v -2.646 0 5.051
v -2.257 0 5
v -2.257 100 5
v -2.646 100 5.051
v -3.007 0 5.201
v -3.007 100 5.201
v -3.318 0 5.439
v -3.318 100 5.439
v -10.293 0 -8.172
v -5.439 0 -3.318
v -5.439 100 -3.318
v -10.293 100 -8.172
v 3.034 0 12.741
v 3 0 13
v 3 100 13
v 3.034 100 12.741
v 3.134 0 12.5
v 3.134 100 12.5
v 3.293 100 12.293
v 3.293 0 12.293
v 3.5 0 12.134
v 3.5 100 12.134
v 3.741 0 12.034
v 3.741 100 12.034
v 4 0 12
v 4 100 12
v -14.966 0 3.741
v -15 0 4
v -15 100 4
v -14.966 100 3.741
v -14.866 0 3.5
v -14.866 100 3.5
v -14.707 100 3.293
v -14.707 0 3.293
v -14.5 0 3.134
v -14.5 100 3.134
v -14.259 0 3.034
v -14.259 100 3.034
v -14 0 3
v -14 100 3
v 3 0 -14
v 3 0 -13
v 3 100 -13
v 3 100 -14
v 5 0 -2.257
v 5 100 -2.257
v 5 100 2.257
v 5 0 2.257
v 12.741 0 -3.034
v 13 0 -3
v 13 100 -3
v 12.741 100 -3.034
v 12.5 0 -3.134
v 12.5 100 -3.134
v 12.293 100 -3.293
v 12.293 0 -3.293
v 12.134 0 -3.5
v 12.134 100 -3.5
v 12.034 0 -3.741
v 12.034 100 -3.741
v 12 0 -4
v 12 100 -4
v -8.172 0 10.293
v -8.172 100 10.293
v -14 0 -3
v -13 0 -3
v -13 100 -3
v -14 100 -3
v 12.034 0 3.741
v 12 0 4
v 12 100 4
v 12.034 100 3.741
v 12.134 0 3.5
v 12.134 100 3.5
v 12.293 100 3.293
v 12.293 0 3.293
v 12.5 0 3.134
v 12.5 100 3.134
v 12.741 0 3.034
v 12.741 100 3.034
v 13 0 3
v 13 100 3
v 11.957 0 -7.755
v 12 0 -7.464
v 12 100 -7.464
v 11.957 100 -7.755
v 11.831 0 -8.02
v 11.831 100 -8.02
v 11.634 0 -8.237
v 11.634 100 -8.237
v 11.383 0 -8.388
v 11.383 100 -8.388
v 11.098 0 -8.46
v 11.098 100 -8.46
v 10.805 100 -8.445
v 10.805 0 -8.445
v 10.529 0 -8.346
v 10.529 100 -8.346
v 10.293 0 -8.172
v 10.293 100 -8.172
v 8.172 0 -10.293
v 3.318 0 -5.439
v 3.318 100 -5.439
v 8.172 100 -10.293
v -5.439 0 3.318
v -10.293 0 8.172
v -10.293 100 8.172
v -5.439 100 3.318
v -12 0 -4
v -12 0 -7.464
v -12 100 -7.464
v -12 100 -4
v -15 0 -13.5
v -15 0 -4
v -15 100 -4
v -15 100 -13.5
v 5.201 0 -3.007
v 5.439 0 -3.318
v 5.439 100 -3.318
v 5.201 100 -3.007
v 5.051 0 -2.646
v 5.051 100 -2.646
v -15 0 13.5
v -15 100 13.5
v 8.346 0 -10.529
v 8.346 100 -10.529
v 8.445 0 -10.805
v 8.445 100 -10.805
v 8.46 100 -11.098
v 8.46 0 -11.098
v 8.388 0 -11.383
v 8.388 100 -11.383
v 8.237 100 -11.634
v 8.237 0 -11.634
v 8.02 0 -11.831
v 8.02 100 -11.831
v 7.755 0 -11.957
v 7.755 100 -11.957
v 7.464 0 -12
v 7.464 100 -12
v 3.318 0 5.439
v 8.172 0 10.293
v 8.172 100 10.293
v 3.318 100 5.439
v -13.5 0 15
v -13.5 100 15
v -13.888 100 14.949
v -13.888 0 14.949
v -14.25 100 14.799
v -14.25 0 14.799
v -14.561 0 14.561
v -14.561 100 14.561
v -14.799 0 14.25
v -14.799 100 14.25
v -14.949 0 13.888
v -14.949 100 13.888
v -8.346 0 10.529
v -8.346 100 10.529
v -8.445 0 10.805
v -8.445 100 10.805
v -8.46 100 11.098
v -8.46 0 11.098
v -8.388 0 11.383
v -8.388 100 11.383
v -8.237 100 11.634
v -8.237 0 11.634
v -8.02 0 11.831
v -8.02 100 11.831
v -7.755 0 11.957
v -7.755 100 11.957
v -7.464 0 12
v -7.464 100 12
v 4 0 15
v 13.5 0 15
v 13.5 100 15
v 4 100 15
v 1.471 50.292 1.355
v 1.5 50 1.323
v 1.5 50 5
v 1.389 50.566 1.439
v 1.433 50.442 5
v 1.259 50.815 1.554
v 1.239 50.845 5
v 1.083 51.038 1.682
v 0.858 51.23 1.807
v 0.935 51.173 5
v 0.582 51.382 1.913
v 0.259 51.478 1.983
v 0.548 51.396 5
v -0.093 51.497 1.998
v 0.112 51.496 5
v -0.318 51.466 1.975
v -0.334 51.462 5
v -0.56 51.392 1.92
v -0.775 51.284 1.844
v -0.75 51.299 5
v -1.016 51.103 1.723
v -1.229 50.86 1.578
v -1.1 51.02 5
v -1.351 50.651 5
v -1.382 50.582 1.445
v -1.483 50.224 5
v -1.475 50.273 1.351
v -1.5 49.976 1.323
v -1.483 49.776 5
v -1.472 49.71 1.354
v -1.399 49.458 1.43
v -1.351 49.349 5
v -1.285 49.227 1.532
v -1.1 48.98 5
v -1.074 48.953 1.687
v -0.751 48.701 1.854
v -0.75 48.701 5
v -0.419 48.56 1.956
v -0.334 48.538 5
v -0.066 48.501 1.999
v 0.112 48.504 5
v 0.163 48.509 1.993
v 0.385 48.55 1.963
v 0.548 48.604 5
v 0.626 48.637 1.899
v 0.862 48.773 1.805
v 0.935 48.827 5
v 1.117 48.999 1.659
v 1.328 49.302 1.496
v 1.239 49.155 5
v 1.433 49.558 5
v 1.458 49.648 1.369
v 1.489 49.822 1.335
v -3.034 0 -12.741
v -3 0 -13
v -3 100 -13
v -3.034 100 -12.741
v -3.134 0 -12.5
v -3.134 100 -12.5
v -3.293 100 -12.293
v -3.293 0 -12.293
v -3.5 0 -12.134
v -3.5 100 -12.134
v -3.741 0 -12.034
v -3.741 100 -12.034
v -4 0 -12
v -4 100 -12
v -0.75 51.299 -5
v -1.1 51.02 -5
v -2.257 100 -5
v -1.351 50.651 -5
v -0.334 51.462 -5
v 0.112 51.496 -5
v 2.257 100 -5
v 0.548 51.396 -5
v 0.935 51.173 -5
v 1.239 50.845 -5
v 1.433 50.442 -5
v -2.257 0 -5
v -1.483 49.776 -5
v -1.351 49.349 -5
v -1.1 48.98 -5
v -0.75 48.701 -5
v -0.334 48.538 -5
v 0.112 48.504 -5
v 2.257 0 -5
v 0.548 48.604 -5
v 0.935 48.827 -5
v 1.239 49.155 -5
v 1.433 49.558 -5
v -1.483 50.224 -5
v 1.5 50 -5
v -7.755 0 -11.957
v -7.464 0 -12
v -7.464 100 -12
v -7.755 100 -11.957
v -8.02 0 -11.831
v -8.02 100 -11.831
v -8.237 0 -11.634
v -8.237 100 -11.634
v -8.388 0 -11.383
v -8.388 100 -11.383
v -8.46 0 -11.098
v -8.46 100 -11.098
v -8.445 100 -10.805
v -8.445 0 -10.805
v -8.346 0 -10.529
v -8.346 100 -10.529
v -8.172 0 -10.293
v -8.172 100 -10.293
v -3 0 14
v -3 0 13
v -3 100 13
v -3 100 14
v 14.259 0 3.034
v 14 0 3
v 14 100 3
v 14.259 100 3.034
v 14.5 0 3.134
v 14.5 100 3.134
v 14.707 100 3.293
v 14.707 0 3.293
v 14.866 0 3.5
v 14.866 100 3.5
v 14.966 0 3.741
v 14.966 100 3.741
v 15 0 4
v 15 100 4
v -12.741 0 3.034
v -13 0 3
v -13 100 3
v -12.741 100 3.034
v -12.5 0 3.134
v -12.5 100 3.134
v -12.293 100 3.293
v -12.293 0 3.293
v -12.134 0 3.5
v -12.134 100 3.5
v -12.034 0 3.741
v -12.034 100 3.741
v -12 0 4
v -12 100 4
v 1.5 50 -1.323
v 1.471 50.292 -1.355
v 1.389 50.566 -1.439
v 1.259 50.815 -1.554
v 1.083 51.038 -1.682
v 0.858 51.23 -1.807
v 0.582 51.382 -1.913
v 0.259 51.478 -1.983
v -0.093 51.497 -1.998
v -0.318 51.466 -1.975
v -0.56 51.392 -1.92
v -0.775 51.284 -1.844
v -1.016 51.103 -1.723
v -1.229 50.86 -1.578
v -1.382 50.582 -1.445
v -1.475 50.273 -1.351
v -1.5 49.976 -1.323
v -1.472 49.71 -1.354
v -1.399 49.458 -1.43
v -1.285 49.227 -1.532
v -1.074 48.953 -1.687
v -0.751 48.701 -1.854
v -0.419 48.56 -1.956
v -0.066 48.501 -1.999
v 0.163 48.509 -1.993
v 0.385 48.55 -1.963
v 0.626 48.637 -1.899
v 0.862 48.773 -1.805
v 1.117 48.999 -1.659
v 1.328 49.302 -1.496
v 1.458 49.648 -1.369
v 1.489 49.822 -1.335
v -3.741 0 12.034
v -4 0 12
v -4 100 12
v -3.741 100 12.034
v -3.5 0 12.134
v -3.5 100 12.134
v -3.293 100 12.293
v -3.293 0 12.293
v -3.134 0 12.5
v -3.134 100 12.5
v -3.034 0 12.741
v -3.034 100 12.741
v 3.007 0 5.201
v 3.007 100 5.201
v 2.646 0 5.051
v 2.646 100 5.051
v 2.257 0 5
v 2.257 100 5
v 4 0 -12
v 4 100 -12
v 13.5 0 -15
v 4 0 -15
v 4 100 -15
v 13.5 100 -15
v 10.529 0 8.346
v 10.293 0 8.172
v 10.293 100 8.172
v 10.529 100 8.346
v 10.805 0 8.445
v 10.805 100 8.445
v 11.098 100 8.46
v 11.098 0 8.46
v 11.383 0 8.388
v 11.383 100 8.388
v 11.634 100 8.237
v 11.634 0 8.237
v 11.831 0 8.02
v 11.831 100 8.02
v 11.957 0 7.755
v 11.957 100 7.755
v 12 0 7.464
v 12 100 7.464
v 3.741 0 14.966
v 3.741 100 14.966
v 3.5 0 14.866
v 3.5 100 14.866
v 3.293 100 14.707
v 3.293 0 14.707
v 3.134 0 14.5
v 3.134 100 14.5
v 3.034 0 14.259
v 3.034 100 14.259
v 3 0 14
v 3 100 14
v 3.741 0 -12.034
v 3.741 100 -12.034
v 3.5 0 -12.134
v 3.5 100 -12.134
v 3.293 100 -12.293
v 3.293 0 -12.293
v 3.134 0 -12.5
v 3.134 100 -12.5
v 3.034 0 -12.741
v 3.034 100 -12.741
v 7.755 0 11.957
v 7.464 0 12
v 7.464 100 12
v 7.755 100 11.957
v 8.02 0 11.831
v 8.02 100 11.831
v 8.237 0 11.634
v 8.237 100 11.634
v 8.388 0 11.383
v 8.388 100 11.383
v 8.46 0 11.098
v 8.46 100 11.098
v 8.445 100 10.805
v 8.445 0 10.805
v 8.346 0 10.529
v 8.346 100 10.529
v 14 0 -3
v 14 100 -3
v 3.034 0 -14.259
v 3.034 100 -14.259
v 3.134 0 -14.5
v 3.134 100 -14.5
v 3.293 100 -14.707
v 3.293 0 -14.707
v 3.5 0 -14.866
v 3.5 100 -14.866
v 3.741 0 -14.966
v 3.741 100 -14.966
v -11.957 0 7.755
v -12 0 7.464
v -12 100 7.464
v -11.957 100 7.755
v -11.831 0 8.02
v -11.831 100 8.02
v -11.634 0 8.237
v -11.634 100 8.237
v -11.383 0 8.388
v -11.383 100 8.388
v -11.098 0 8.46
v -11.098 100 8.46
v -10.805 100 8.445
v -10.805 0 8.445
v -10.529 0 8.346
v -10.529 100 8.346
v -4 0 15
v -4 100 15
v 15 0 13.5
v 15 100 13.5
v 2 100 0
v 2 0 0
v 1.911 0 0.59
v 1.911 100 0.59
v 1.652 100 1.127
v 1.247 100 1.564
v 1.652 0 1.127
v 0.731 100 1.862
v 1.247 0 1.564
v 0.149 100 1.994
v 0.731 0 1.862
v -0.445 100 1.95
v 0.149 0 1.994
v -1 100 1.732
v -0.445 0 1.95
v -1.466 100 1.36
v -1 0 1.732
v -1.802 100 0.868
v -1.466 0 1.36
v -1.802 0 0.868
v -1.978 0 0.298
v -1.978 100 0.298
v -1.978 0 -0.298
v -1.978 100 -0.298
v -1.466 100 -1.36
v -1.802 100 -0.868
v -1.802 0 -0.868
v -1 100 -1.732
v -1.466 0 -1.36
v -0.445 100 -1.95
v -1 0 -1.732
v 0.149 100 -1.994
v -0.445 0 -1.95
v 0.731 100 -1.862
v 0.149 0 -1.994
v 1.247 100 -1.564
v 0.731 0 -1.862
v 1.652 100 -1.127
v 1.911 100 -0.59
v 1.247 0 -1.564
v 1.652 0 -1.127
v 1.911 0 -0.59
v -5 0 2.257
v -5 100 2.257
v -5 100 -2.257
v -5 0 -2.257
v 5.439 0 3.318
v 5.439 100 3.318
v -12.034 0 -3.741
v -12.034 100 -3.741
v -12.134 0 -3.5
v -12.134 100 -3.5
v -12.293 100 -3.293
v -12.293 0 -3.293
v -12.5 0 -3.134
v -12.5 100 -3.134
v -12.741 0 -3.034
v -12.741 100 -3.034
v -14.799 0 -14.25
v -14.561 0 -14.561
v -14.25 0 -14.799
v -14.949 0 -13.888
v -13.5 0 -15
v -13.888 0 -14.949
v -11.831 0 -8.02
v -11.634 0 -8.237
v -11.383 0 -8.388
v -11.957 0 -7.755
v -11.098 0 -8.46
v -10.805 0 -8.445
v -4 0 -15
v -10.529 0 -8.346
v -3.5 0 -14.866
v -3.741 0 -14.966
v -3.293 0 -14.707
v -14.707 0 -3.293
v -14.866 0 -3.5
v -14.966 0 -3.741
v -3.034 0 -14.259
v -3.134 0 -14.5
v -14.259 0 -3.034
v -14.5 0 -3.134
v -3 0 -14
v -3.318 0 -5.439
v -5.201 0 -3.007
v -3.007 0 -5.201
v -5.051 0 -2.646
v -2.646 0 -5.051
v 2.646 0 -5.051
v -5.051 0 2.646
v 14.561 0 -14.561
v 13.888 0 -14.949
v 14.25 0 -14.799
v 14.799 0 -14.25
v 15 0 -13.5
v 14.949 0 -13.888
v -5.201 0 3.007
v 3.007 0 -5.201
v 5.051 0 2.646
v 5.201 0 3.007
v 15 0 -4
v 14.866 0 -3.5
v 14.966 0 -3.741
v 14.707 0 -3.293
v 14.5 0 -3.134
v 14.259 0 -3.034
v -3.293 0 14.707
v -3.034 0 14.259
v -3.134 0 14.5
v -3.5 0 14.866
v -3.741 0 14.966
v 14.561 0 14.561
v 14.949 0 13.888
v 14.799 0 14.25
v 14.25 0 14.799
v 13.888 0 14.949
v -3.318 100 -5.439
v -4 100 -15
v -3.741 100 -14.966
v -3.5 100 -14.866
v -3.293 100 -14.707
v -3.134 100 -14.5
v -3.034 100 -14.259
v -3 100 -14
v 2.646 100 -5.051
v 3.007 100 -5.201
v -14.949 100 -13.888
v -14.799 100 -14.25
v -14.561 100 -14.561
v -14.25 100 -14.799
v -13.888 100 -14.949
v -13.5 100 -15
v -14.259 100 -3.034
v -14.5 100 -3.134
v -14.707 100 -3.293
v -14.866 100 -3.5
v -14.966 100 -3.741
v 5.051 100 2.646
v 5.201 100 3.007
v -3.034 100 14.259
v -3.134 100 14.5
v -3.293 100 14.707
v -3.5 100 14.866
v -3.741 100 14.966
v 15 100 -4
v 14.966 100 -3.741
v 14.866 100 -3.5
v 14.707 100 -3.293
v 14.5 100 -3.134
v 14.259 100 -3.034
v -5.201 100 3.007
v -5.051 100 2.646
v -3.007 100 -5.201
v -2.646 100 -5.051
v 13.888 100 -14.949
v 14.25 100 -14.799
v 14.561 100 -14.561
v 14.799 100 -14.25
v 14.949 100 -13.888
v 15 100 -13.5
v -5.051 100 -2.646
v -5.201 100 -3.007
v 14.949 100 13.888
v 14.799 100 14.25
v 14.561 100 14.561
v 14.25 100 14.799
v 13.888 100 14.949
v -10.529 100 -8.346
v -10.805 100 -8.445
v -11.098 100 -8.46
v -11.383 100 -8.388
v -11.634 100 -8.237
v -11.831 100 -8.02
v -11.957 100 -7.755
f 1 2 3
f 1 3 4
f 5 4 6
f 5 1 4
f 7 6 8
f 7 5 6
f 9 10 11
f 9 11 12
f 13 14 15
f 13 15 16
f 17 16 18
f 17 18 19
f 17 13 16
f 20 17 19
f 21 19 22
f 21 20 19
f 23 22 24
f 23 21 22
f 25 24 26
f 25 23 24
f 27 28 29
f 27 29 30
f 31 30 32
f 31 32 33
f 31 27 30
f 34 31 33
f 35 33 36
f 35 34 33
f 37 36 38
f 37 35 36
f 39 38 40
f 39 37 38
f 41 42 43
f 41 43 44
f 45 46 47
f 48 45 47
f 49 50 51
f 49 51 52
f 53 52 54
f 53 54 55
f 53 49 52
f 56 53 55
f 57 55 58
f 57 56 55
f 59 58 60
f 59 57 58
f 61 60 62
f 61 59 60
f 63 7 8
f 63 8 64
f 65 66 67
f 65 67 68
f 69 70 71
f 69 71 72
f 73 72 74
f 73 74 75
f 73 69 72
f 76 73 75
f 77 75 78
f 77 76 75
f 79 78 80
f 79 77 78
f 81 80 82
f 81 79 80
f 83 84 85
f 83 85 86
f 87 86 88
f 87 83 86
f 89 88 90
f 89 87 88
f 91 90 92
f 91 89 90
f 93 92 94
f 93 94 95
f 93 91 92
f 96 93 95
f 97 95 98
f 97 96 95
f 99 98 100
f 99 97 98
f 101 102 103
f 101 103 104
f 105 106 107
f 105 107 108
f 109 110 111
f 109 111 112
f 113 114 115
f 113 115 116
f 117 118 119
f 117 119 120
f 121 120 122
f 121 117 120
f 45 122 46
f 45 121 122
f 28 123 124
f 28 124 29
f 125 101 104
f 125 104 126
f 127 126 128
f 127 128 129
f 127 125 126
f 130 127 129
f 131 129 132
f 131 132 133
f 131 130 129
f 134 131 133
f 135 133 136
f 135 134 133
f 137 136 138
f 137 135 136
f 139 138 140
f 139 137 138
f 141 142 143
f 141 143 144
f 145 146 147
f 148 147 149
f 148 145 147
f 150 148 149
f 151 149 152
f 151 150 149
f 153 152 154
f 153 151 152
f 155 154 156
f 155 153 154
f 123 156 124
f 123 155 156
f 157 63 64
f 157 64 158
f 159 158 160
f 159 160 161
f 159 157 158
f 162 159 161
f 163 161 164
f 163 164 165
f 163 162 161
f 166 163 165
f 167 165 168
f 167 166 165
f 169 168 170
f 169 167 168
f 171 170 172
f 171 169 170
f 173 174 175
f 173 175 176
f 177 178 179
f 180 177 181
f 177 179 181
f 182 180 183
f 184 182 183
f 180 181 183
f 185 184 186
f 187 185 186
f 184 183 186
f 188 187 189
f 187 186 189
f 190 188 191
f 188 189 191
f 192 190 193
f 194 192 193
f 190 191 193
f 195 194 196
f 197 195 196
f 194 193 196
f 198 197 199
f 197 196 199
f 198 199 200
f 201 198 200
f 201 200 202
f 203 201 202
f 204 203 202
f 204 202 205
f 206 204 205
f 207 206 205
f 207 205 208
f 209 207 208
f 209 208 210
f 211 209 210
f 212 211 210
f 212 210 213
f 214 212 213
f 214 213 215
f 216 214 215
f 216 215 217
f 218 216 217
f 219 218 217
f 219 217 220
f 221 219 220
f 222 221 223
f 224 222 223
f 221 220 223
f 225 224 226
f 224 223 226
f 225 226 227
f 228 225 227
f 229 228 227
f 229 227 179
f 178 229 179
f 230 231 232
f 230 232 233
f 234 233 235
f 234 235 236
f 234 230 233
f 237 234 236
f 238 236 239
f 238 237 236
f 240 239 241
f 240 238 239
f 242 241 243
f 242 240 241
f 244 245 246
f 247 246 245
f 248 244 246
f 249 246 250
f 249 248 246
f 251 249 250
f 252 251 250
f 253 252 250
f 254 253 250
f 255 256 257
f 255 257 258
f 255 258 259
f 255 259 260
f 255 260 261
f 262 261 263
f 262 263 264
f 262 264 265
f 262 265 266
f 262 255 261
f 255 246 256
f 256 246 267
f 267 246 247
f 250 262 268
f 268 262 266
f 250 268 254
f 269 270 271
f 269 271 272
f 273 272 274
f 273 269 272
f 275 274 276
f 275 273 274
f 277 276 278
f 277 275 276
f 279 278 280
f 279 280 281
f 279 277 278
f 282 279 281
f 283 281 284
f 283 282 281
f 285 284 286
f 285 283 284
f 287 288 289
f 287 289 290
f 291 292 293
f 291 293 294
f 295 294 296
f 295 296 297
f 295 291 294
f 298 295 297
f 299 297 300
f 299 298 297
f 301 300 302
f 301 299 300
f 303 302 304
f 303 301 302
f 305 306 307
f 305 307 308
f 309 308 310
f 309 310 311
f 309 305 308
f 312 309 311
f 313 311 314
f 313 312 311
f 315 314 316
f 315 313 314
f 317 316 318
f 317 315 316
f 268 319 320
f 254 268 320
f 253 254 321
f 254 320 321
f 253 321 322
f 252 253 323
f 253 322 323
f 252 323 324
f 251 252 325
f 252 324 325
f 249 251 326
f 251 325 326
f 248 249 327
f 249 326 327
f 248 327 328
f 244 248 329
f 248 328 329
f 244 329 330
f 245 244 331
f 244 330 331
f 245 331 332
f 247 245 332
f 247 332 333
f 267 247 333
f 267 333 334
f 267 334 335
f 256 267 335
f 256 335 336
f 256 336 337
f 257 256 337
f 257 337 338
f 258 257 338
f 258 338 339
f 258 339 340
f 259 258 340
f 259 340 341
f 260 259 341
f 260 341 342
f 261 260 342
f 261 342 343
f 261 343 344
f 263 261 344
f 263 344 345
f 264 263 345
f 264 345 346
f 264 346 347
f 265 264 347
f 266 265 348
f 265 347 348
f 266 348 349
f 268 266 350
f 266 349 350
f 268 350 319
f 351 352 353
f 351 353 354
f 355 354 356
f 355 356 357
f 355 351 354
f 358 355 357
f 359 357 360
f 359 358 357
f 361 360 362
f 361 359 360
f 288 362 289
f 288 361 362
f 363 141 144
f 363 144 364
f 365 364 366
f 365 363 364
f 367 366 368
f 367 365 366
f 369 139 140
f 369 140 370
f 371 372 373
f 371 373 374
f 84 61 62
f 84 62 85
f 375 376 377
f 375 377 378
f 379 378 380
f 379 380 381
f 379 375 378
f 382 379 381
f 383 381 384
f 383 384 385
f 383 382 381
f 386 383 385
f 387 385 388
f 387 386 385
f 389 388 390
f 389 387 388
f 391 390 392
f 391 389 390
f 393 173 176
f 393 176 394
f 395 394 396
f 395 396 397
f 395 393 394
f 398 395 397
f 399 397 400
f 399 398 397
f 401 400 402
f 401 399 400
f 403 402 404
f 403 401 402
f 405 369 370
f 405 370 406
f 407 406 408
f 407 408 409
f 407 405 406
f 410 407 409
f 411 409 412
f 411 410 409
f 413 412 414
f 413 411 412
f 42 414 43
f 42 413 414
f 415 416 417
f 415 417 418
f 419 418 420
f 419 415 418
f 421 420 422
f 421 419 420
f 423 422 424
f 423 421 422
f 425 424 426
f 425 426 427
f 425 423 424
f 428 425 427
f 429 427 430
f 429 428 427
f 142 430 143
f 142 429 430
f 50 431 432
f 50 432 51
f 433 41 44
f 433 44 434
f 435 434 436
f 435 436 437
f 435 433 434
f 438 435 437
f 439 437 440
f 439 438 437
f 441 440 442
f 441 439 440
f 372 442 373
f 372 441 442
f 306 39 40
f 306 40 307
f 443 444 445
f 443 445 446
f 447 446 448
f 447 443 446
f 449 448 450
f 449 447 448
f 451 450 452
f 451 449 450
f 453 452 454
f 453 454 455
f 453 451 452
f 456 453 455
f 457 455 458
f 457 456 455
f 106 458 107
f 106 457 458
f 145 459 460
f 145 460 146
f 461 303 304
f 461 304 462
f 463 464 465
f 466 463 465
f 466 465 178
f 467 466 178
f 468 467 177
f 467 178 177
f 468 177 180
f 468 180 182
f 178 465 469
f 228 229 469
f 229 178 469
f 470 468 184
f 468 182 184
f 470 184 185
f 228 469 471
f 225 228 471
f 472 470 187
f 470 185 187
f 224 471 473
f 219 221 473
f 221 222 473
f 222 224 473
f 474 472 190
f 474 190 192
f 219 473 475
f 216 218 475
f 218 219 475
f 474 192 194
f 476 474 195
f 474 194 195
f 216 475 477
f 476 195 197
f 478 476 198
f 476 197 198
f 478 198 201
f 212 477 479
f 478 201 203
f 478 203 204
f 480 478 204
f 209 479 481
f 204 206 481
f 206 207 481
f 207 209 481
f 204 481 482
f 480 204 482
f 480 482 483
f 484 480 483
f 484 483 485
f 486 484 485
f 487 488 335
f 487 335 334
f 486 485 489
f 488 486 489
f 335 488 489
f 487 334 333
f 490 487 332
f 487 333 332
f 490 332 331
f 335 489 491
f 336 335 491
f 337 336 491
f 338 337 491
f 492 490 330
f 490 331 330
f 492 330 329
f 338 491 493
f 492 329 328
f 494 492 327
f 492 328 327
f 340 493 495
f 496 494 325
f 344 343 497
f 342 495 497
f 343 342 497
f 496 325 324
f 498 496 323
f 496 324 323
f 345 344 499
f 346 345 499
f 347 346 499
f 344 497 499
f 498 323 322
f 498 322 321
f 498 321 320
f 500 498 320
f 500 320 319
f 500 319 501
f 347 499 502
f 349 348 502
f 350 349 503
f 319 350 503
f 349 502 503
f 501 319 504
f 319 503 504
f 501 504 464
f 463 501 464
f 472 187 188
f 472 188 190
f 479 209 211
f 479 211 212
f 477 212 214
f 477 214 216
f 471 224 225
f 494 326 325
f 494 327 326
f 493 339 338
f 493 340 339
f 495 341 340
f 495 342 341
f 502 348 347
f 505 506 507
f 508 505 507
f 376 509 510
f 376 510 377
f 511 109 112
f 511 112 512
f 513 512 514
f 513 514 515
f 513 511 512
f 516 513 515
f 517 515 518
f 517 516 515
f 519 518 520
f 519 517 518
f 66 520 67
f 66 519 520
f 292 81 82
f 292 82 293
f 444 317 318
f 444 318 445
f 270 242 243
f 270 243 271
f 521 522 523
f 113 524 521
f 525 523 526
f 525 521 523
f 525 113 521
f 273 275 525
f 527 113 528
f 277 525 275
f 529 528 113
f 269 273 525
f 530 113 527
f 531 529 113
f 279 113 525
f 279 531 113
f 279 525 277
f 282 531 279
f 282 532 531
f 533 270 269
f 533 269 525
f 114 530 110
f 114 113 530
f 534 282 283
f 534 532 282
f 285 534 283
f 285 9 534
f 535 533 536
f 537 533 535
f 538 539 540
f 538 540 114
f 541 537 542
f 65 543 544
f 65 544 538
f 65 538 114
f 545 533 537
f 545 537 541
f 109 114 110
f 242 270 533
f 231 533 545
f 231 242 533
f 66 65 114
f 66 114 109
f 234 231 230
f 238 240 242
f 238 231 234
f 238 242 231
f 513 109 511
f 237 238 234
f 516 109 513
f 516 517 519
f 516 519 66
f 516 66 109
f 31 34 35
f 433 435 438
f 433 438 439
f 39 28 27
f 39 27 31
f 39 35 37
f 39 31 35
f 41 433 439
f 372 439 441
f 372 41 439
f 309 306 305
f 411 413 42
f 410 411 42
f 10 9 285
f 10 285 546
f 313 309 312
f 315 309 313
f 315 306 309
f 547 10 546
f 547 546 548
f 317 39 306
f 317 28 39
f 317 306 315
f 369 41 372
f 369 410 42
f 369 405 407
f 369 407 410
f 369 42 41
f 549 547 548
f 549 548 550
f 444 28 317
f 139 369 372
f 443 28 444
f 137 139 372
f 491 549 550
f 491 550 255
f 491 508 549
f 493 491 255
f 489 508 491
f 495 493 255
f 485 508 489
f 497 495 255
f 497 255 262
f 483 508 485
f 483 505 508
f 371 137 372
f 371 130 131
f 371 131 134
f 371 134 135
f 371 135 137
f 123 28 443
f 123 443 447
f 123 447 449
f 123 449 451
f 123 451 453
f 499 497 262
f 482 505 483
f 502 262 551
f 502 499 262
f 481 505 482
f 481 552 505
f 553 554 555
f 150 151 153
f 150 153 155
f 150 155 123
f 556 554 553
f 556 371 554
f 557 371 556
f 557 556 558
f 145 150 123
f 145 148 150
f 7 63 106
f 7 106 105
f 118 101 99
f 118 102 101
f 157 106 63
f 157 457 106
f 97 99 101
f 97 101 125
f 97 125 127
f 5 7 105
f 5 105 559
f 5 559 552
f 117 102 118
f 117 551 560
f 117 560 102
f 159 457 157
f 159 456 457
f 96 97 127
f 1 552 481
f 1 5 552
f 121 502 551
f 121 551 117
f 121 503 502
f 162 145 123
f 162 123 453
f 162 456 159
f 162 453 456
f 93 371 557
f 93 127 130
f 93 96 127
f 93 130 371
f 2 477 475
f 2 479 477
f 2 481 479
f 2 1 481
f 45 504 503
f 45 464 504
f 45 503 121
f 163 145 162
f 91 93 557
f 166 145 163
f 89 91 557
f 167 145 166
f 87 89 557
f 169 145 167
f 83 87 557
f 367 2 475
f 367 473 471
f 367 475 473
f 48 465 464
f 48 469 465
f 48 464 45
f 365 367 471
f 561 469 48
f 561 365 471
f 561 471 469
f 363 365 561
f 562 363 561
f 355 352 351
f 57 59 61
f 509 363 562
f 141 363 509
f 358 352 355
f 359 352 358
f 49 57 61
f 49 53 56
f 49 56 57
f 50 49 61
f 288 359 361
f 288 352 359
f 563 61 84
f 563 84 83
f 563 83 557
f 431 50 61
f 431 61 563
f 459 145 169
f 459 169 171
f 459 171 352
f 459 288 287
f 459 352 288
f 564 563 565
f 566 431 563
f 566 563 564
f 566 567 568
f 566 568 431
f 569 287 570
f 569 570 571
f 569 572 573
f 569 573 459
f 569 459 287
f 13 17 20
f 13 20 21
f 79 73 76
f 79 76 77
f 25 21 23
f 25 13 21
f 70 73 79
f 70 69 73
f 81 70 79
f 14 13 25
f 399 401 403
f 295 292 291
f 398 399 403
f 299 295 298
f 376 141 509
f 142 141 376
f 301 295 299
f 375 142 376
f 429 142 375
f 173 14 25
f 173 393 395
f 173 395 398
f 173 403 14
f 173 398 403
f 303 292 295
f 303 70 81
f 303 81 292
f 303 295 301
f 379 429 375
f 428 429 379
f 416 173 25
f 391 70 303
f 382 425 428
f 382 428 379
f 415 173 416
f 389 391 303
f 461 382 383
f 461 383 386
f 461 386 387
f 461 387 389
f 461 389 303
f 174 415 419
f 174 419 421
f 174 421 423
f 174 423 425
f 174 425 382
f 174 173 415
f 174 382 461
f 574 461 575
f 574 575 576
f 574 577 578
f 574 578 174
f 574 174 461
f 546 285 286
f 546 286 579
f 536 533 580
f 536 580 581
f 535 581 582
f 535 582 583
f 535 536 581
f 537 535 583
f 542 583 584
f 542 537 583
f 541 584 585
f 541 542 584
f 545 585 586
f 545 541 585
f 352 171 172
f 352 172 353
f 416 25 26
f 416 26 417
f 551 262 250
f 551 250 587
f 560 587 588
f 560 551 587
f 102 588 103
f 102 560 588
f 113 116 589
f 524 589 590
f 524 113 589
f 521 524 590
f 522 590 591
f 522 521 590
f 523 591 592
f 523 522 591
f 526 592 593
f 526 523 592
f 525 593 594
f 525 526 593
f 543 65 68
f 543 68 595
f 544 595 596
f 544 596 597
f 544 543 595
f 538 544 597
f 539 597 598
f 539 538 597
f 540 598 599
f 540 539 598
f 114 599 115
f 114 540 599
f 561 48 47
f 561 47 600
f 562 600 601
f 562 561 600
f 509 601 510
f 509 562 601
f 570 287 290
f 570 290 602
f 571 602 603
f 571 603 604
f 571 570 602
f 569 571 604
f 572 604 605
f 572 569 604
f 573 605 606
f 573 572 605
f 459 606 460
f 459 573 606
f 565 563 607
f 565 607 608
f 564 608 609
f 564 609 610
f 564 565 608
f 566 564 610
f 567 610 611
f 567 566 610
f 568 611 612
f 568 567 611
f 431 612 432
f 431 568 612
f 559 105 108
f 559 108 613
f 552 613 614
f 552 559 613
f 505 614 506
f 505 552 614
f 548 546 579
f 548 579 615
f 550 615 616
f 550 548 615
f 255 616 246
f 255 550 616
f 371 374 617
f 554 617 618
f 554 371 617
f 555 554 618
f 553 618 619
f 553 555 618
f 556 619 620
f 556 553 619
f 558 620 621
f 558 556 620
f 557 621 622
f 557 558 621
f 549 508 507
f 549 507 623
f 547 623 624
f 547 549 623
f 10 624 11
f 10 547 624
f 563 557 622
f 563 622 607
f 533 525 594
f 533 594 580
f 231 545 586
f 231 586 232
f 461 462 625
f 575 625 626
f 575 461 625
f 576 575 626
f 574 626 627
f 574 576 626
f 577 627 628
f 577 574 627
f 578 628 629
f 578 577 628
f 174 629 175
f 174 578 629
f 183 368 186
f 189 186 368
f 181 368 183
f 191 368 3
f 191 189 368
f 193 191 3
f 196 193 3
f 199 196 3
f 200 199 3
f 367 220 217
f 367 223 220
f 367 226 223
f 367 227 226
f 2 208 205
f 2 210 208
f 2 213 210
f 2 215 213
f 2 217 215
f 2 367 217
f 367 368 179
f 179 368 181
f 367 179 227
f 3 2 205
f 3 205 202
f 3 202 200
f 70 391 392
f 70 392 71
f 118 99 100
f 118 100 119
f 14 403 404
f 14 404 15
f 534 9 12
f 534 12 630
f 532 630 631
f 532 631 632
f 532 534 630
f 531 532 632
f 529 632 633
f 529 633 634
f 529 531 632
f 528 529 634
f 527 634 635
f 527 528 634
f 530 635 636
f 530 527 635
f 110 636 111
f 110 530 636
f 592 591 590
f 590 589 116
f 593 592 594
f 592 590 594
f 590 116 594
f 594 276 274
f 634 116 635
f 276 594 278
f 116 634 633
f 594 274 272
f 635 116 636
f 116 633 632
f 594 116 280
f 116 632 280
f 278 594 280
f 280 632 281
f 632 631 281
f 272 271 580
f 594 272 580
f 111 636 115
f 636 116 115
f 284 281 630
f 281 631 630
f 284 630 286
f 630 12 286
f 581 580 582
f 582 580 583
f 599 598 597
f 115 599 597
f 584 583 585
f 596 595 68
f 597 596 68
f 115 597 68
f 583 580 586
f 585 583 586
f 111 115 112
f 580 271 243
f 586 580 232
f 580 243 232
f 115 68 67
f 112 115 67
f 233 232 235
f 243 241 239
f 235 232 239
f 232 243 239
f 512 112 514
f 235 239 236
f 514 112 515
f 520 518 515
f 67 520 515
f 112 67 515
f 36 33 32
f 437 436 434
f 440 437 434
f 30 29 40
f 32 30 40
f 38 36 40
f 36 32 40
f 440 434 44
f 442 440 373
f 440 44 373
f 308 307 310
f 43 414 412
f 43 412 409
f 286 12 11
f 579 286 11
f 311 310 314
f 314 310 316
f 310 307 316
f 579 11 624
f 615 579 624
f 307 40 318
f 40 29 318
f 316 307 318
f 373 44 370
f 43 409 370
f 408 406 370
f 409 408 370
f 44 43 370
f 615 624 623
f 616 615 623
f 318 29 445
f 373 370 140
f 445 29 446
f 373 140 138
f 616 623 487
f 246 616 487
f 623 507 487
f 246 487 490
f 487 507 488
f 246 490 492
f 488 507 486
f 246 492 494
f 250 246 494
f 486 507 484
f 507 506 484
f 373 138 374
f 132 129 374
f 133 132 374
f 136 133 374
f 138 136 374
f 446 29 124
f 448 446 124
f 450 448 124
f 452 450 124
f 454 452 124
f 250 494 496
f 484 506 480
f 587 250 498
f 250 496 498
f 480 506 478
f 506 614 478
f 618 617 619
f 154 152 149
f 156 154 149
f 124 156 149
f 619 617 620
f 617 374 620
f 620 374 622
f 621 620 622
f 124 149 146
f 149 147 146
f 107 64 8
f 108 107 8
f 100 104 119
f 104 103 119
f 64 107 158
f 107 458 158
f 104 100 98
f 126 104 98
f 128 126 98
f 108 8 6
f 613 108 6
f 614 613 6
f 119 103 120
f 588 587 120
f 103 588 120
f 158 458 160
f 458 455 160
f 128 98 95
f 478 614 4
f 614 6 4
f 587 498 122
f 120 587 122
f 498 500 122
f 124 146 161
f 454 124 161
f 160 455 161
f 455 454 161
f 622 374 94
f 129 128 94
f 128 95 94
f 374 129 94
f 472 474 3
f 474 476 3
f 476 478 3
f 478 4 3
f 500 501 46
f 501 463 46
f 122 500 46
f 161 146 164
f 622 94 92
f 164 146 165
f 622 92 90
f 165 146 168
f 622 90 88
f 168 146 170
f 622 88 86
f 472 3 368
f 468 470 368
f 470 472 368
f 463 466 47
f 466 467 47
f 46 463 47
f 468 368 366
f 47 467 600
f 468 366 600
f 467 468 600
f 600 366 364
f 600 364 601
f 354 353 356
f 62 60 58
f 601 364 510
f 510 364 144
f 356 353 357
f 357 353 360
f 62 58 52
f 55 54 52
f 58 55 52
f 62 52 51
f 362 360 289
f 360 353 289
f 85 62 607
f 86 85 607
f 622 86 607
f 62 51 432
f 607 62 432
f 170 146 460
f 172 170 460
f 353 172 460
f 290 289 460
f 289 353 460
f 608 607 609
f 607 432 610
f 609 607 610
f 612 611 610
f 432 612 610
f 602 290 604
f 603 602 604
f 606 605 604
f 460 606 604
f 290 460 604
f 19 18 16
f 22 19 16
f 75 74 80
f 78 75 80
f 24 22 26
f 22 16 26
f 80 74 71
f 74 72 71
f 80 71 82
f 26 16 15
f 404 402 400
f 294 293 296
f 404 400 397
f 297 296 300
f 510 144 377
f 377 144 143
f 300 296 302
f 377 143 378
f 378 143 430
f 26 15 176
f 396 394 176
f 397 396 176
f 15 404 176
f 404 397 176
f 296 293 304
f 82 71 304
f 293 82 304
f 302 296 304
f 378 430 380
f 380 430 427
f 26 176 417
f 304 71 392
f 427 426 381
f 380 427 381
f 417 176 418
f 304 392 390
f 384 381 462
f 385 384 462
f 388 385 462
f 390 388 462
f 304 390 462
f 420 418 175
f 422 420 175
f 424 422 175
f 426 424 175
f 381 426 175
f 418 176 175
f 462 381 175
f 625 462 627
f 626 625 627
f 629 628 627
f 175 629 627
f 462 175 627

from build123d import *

# Parameters (mm, degrees)
F0_R     = 2
F1_DEPTH = 100
F2_R     = 1.5
F3_DEPTH = 10


with BuildPart() as f1:
    # F0 (on Front) → F1 (new body)
    with BuildSketch(Plane.XZ):
        with BuildLine():
            ThreePointArc((15, 13.5), (14.56066, 14.56066), (13.5, 15))
            Line((13.5, 15), (4, 15))
            ThreePointArc((4, 15), (3.292893, 14.707107), (3, 14))
            Line((3, 14), (3, 13))
            ThreePointArc((3, 13), (3.292893, 12.292893), (4, 12))
            Line((4, 12), (7.464466, 12))
            ThreePointArc((7.464466, 12), (8.388346, 11.382683), (8.171573, 10.292893))
            Line((8.171573, 10.292893), (3.318019, 5.43934))
            ThreePointArc((3.318019, 5.43934), (2.831384, 5.114181), (2.257359, 5))
            Line((2.257359, 5), (-2.257359, 5))
            ThreePointArc((-2.257359, 5), (-2.831384, 5.114181), (-3.318019, 5.43934))
            Line((-3.318019, 5.43934), (-8.171573, 10.292893))
            ThreePointArc((-8.171573, 10.292893), (-8.388346, 11.382683), (-7.464466, 12))
            Line((-7.464466, 12), (-4, 12))
            ThreePointArc((-4, 12), (-3.292893, 12.292893), (-3, 13))
            Line((-3, 13), (-3, 14))
            ThreePointArc((-3, 14), (-3.292893, 14.707107), (-4, 15))
            Line((-4, 15), (-13.5, 15))
            ThreePointArc((-13.5, 15), (-14.56066, 14.56066), (-15, 13.5))
            Line((-15, 13.5), (-15, 4))
            ThreePointArc((-15, 4), (-14.707107, 3.292893), (-14, 3))
            Line((-14, 3), (-13, 3))
            ThreePointArc((-13, 3), (-12.292893, 3.292893), (-12, 4))
            Line((-12, 4), (-12, 7.464466))
            ThreePointArc((-12, 7.464466), (-11.382683, 8.388346), (-10.292893, 8.171573))
            Line((-10.292893, 8.171573), (-5.43934, 3.318019))
            ThreePointArc((-5.43934, 3.318019), (-5.114181, 2.831384), (-5, 2.257359))
            Line((-5, 2.257359), (-5, -2.257359))
            ThreePointArc((-5, -2.257359), (-5.114181, -2.831384), (-5.43934, -3.318019))
            Line((-5.43934, -3.318019), (-10.292893, -8.171573))
            ThreePointArc((-10.292893, -8.171573), (-11.382683, -8.388346), (-12, -7.464466))
            Line((-12, -7.464466), (-12, -4))
            ThreePointArc((-12, -4), (-12.292893, -3.292893), (-13, -3))
            Line((-13, -3), (-14, -3))
            ThreePointArc((-14, -3), (-14.707107, -3.292893), (-15, -4))
            Line((-15, -4), (-15, -13.5))
            ThreePointArc((-15, -13.5), (-14.56066, -14.56066), (-13.5, -15))
            Line((-13.5, -15), (-4, -15))
            ThreePointArc((-4, -15), (-3.292893, -14.707107), (-3, -14))
            Line((-3, -14), (-3, -13))
            ThreePointArc((-3, -13), (-3.292893, -12.292893), (-4, -12))
            Line((-4, -12), (-7.464466, -12))
            ThreePointArc((-7.464466, -12), (-8.388346, -11.382683), (-8.171573, -10.292893))
            Line((-8.171573, -10.292893), (-3.318019, -5.43934))
            ThreePointArc((-3.318019, -5.43934), (-2.831384, -5.114181), (-2.257359, -5))
            Line((-2.257359, -5), (2.257359, -5))
            ThreePointArc((2.257359, -5), (2.831384, -5.114181), (3.318019, -5.43934))
            Line((3.318019, -5.43934), (8.171573, -10.292893))
            ThreePointArc((8.171573, -10.292893), (8.388346, -11.382683), (7.464466, -12))
            Line((7.464466, -12), (4, -12))
            ThreePointArc((4, -12), (3.292893, -12.292893), (3, -13))
            Line((3, -13), (3, -14))
            ThreePointArc((3, -14), (3.292893, -14.707107), (4, -15))
            Line((4, -15), (13.5, -15))
            ThreePointArc((13.5, -15), (14.56066, -14.56066), (15, -13.5))
            Line((15, -13.5), (15, -4))
            ThreePointArc((15, -4), (14.707107, -3.292893), (14, -3))
            Line((14, -3), (13, -3))
            ThreePointArc((13, -3), (12.292893, -3.292893), (12, -4))
            Line((12, -4), (12, -7.464466))
            ThreePointArc((12, -7.464466), (11.382683, -8.388346), (10.292893, -8.171573))
            Line((10.292893, -8.171573), (5.43934, -3.318019))
            ThreePointArc((5.43934, -3.318019), (5.114181, -2.831384), (5, -2.257359))
            Line((5, -2.257359), (5, 2.257359))
            ThreePointArc((5, 2.257359), (5.114181, 2.831384), (5.43934, 3.318019))
            Line((5.43934, 3.318019), (10.292893, 8.171573))
            ThreePointArc((10.292893, 8.171573), (11.382683, 8.388346), (12, 7.464466))
            Line((12, 7.464466), (12, 4))
            ThreePointArc((12, 4), (12.292893, 3.292893), (13, 3))
            Line((13, 3), (14, 3))
            ThreePointArc((14, 3), (14.707107, 3.292893), (15, 4))
            Line((15, 4), (15, 13.5))
        make_face()
        Circle(F0_R, mode=Mode.SUBTRACT)
    extrude(amount=-F1_DEPTH)

    # F2 (on face) → F3 (cut)
    with BuildSketch(Plane.XY.offset(5)):
        with Locations((0, 50)):
            Circle(F2_R)
    extrude(amount=-F3_DEPTH, mode=Mode.SUBTRACT)


solid = f1.part
